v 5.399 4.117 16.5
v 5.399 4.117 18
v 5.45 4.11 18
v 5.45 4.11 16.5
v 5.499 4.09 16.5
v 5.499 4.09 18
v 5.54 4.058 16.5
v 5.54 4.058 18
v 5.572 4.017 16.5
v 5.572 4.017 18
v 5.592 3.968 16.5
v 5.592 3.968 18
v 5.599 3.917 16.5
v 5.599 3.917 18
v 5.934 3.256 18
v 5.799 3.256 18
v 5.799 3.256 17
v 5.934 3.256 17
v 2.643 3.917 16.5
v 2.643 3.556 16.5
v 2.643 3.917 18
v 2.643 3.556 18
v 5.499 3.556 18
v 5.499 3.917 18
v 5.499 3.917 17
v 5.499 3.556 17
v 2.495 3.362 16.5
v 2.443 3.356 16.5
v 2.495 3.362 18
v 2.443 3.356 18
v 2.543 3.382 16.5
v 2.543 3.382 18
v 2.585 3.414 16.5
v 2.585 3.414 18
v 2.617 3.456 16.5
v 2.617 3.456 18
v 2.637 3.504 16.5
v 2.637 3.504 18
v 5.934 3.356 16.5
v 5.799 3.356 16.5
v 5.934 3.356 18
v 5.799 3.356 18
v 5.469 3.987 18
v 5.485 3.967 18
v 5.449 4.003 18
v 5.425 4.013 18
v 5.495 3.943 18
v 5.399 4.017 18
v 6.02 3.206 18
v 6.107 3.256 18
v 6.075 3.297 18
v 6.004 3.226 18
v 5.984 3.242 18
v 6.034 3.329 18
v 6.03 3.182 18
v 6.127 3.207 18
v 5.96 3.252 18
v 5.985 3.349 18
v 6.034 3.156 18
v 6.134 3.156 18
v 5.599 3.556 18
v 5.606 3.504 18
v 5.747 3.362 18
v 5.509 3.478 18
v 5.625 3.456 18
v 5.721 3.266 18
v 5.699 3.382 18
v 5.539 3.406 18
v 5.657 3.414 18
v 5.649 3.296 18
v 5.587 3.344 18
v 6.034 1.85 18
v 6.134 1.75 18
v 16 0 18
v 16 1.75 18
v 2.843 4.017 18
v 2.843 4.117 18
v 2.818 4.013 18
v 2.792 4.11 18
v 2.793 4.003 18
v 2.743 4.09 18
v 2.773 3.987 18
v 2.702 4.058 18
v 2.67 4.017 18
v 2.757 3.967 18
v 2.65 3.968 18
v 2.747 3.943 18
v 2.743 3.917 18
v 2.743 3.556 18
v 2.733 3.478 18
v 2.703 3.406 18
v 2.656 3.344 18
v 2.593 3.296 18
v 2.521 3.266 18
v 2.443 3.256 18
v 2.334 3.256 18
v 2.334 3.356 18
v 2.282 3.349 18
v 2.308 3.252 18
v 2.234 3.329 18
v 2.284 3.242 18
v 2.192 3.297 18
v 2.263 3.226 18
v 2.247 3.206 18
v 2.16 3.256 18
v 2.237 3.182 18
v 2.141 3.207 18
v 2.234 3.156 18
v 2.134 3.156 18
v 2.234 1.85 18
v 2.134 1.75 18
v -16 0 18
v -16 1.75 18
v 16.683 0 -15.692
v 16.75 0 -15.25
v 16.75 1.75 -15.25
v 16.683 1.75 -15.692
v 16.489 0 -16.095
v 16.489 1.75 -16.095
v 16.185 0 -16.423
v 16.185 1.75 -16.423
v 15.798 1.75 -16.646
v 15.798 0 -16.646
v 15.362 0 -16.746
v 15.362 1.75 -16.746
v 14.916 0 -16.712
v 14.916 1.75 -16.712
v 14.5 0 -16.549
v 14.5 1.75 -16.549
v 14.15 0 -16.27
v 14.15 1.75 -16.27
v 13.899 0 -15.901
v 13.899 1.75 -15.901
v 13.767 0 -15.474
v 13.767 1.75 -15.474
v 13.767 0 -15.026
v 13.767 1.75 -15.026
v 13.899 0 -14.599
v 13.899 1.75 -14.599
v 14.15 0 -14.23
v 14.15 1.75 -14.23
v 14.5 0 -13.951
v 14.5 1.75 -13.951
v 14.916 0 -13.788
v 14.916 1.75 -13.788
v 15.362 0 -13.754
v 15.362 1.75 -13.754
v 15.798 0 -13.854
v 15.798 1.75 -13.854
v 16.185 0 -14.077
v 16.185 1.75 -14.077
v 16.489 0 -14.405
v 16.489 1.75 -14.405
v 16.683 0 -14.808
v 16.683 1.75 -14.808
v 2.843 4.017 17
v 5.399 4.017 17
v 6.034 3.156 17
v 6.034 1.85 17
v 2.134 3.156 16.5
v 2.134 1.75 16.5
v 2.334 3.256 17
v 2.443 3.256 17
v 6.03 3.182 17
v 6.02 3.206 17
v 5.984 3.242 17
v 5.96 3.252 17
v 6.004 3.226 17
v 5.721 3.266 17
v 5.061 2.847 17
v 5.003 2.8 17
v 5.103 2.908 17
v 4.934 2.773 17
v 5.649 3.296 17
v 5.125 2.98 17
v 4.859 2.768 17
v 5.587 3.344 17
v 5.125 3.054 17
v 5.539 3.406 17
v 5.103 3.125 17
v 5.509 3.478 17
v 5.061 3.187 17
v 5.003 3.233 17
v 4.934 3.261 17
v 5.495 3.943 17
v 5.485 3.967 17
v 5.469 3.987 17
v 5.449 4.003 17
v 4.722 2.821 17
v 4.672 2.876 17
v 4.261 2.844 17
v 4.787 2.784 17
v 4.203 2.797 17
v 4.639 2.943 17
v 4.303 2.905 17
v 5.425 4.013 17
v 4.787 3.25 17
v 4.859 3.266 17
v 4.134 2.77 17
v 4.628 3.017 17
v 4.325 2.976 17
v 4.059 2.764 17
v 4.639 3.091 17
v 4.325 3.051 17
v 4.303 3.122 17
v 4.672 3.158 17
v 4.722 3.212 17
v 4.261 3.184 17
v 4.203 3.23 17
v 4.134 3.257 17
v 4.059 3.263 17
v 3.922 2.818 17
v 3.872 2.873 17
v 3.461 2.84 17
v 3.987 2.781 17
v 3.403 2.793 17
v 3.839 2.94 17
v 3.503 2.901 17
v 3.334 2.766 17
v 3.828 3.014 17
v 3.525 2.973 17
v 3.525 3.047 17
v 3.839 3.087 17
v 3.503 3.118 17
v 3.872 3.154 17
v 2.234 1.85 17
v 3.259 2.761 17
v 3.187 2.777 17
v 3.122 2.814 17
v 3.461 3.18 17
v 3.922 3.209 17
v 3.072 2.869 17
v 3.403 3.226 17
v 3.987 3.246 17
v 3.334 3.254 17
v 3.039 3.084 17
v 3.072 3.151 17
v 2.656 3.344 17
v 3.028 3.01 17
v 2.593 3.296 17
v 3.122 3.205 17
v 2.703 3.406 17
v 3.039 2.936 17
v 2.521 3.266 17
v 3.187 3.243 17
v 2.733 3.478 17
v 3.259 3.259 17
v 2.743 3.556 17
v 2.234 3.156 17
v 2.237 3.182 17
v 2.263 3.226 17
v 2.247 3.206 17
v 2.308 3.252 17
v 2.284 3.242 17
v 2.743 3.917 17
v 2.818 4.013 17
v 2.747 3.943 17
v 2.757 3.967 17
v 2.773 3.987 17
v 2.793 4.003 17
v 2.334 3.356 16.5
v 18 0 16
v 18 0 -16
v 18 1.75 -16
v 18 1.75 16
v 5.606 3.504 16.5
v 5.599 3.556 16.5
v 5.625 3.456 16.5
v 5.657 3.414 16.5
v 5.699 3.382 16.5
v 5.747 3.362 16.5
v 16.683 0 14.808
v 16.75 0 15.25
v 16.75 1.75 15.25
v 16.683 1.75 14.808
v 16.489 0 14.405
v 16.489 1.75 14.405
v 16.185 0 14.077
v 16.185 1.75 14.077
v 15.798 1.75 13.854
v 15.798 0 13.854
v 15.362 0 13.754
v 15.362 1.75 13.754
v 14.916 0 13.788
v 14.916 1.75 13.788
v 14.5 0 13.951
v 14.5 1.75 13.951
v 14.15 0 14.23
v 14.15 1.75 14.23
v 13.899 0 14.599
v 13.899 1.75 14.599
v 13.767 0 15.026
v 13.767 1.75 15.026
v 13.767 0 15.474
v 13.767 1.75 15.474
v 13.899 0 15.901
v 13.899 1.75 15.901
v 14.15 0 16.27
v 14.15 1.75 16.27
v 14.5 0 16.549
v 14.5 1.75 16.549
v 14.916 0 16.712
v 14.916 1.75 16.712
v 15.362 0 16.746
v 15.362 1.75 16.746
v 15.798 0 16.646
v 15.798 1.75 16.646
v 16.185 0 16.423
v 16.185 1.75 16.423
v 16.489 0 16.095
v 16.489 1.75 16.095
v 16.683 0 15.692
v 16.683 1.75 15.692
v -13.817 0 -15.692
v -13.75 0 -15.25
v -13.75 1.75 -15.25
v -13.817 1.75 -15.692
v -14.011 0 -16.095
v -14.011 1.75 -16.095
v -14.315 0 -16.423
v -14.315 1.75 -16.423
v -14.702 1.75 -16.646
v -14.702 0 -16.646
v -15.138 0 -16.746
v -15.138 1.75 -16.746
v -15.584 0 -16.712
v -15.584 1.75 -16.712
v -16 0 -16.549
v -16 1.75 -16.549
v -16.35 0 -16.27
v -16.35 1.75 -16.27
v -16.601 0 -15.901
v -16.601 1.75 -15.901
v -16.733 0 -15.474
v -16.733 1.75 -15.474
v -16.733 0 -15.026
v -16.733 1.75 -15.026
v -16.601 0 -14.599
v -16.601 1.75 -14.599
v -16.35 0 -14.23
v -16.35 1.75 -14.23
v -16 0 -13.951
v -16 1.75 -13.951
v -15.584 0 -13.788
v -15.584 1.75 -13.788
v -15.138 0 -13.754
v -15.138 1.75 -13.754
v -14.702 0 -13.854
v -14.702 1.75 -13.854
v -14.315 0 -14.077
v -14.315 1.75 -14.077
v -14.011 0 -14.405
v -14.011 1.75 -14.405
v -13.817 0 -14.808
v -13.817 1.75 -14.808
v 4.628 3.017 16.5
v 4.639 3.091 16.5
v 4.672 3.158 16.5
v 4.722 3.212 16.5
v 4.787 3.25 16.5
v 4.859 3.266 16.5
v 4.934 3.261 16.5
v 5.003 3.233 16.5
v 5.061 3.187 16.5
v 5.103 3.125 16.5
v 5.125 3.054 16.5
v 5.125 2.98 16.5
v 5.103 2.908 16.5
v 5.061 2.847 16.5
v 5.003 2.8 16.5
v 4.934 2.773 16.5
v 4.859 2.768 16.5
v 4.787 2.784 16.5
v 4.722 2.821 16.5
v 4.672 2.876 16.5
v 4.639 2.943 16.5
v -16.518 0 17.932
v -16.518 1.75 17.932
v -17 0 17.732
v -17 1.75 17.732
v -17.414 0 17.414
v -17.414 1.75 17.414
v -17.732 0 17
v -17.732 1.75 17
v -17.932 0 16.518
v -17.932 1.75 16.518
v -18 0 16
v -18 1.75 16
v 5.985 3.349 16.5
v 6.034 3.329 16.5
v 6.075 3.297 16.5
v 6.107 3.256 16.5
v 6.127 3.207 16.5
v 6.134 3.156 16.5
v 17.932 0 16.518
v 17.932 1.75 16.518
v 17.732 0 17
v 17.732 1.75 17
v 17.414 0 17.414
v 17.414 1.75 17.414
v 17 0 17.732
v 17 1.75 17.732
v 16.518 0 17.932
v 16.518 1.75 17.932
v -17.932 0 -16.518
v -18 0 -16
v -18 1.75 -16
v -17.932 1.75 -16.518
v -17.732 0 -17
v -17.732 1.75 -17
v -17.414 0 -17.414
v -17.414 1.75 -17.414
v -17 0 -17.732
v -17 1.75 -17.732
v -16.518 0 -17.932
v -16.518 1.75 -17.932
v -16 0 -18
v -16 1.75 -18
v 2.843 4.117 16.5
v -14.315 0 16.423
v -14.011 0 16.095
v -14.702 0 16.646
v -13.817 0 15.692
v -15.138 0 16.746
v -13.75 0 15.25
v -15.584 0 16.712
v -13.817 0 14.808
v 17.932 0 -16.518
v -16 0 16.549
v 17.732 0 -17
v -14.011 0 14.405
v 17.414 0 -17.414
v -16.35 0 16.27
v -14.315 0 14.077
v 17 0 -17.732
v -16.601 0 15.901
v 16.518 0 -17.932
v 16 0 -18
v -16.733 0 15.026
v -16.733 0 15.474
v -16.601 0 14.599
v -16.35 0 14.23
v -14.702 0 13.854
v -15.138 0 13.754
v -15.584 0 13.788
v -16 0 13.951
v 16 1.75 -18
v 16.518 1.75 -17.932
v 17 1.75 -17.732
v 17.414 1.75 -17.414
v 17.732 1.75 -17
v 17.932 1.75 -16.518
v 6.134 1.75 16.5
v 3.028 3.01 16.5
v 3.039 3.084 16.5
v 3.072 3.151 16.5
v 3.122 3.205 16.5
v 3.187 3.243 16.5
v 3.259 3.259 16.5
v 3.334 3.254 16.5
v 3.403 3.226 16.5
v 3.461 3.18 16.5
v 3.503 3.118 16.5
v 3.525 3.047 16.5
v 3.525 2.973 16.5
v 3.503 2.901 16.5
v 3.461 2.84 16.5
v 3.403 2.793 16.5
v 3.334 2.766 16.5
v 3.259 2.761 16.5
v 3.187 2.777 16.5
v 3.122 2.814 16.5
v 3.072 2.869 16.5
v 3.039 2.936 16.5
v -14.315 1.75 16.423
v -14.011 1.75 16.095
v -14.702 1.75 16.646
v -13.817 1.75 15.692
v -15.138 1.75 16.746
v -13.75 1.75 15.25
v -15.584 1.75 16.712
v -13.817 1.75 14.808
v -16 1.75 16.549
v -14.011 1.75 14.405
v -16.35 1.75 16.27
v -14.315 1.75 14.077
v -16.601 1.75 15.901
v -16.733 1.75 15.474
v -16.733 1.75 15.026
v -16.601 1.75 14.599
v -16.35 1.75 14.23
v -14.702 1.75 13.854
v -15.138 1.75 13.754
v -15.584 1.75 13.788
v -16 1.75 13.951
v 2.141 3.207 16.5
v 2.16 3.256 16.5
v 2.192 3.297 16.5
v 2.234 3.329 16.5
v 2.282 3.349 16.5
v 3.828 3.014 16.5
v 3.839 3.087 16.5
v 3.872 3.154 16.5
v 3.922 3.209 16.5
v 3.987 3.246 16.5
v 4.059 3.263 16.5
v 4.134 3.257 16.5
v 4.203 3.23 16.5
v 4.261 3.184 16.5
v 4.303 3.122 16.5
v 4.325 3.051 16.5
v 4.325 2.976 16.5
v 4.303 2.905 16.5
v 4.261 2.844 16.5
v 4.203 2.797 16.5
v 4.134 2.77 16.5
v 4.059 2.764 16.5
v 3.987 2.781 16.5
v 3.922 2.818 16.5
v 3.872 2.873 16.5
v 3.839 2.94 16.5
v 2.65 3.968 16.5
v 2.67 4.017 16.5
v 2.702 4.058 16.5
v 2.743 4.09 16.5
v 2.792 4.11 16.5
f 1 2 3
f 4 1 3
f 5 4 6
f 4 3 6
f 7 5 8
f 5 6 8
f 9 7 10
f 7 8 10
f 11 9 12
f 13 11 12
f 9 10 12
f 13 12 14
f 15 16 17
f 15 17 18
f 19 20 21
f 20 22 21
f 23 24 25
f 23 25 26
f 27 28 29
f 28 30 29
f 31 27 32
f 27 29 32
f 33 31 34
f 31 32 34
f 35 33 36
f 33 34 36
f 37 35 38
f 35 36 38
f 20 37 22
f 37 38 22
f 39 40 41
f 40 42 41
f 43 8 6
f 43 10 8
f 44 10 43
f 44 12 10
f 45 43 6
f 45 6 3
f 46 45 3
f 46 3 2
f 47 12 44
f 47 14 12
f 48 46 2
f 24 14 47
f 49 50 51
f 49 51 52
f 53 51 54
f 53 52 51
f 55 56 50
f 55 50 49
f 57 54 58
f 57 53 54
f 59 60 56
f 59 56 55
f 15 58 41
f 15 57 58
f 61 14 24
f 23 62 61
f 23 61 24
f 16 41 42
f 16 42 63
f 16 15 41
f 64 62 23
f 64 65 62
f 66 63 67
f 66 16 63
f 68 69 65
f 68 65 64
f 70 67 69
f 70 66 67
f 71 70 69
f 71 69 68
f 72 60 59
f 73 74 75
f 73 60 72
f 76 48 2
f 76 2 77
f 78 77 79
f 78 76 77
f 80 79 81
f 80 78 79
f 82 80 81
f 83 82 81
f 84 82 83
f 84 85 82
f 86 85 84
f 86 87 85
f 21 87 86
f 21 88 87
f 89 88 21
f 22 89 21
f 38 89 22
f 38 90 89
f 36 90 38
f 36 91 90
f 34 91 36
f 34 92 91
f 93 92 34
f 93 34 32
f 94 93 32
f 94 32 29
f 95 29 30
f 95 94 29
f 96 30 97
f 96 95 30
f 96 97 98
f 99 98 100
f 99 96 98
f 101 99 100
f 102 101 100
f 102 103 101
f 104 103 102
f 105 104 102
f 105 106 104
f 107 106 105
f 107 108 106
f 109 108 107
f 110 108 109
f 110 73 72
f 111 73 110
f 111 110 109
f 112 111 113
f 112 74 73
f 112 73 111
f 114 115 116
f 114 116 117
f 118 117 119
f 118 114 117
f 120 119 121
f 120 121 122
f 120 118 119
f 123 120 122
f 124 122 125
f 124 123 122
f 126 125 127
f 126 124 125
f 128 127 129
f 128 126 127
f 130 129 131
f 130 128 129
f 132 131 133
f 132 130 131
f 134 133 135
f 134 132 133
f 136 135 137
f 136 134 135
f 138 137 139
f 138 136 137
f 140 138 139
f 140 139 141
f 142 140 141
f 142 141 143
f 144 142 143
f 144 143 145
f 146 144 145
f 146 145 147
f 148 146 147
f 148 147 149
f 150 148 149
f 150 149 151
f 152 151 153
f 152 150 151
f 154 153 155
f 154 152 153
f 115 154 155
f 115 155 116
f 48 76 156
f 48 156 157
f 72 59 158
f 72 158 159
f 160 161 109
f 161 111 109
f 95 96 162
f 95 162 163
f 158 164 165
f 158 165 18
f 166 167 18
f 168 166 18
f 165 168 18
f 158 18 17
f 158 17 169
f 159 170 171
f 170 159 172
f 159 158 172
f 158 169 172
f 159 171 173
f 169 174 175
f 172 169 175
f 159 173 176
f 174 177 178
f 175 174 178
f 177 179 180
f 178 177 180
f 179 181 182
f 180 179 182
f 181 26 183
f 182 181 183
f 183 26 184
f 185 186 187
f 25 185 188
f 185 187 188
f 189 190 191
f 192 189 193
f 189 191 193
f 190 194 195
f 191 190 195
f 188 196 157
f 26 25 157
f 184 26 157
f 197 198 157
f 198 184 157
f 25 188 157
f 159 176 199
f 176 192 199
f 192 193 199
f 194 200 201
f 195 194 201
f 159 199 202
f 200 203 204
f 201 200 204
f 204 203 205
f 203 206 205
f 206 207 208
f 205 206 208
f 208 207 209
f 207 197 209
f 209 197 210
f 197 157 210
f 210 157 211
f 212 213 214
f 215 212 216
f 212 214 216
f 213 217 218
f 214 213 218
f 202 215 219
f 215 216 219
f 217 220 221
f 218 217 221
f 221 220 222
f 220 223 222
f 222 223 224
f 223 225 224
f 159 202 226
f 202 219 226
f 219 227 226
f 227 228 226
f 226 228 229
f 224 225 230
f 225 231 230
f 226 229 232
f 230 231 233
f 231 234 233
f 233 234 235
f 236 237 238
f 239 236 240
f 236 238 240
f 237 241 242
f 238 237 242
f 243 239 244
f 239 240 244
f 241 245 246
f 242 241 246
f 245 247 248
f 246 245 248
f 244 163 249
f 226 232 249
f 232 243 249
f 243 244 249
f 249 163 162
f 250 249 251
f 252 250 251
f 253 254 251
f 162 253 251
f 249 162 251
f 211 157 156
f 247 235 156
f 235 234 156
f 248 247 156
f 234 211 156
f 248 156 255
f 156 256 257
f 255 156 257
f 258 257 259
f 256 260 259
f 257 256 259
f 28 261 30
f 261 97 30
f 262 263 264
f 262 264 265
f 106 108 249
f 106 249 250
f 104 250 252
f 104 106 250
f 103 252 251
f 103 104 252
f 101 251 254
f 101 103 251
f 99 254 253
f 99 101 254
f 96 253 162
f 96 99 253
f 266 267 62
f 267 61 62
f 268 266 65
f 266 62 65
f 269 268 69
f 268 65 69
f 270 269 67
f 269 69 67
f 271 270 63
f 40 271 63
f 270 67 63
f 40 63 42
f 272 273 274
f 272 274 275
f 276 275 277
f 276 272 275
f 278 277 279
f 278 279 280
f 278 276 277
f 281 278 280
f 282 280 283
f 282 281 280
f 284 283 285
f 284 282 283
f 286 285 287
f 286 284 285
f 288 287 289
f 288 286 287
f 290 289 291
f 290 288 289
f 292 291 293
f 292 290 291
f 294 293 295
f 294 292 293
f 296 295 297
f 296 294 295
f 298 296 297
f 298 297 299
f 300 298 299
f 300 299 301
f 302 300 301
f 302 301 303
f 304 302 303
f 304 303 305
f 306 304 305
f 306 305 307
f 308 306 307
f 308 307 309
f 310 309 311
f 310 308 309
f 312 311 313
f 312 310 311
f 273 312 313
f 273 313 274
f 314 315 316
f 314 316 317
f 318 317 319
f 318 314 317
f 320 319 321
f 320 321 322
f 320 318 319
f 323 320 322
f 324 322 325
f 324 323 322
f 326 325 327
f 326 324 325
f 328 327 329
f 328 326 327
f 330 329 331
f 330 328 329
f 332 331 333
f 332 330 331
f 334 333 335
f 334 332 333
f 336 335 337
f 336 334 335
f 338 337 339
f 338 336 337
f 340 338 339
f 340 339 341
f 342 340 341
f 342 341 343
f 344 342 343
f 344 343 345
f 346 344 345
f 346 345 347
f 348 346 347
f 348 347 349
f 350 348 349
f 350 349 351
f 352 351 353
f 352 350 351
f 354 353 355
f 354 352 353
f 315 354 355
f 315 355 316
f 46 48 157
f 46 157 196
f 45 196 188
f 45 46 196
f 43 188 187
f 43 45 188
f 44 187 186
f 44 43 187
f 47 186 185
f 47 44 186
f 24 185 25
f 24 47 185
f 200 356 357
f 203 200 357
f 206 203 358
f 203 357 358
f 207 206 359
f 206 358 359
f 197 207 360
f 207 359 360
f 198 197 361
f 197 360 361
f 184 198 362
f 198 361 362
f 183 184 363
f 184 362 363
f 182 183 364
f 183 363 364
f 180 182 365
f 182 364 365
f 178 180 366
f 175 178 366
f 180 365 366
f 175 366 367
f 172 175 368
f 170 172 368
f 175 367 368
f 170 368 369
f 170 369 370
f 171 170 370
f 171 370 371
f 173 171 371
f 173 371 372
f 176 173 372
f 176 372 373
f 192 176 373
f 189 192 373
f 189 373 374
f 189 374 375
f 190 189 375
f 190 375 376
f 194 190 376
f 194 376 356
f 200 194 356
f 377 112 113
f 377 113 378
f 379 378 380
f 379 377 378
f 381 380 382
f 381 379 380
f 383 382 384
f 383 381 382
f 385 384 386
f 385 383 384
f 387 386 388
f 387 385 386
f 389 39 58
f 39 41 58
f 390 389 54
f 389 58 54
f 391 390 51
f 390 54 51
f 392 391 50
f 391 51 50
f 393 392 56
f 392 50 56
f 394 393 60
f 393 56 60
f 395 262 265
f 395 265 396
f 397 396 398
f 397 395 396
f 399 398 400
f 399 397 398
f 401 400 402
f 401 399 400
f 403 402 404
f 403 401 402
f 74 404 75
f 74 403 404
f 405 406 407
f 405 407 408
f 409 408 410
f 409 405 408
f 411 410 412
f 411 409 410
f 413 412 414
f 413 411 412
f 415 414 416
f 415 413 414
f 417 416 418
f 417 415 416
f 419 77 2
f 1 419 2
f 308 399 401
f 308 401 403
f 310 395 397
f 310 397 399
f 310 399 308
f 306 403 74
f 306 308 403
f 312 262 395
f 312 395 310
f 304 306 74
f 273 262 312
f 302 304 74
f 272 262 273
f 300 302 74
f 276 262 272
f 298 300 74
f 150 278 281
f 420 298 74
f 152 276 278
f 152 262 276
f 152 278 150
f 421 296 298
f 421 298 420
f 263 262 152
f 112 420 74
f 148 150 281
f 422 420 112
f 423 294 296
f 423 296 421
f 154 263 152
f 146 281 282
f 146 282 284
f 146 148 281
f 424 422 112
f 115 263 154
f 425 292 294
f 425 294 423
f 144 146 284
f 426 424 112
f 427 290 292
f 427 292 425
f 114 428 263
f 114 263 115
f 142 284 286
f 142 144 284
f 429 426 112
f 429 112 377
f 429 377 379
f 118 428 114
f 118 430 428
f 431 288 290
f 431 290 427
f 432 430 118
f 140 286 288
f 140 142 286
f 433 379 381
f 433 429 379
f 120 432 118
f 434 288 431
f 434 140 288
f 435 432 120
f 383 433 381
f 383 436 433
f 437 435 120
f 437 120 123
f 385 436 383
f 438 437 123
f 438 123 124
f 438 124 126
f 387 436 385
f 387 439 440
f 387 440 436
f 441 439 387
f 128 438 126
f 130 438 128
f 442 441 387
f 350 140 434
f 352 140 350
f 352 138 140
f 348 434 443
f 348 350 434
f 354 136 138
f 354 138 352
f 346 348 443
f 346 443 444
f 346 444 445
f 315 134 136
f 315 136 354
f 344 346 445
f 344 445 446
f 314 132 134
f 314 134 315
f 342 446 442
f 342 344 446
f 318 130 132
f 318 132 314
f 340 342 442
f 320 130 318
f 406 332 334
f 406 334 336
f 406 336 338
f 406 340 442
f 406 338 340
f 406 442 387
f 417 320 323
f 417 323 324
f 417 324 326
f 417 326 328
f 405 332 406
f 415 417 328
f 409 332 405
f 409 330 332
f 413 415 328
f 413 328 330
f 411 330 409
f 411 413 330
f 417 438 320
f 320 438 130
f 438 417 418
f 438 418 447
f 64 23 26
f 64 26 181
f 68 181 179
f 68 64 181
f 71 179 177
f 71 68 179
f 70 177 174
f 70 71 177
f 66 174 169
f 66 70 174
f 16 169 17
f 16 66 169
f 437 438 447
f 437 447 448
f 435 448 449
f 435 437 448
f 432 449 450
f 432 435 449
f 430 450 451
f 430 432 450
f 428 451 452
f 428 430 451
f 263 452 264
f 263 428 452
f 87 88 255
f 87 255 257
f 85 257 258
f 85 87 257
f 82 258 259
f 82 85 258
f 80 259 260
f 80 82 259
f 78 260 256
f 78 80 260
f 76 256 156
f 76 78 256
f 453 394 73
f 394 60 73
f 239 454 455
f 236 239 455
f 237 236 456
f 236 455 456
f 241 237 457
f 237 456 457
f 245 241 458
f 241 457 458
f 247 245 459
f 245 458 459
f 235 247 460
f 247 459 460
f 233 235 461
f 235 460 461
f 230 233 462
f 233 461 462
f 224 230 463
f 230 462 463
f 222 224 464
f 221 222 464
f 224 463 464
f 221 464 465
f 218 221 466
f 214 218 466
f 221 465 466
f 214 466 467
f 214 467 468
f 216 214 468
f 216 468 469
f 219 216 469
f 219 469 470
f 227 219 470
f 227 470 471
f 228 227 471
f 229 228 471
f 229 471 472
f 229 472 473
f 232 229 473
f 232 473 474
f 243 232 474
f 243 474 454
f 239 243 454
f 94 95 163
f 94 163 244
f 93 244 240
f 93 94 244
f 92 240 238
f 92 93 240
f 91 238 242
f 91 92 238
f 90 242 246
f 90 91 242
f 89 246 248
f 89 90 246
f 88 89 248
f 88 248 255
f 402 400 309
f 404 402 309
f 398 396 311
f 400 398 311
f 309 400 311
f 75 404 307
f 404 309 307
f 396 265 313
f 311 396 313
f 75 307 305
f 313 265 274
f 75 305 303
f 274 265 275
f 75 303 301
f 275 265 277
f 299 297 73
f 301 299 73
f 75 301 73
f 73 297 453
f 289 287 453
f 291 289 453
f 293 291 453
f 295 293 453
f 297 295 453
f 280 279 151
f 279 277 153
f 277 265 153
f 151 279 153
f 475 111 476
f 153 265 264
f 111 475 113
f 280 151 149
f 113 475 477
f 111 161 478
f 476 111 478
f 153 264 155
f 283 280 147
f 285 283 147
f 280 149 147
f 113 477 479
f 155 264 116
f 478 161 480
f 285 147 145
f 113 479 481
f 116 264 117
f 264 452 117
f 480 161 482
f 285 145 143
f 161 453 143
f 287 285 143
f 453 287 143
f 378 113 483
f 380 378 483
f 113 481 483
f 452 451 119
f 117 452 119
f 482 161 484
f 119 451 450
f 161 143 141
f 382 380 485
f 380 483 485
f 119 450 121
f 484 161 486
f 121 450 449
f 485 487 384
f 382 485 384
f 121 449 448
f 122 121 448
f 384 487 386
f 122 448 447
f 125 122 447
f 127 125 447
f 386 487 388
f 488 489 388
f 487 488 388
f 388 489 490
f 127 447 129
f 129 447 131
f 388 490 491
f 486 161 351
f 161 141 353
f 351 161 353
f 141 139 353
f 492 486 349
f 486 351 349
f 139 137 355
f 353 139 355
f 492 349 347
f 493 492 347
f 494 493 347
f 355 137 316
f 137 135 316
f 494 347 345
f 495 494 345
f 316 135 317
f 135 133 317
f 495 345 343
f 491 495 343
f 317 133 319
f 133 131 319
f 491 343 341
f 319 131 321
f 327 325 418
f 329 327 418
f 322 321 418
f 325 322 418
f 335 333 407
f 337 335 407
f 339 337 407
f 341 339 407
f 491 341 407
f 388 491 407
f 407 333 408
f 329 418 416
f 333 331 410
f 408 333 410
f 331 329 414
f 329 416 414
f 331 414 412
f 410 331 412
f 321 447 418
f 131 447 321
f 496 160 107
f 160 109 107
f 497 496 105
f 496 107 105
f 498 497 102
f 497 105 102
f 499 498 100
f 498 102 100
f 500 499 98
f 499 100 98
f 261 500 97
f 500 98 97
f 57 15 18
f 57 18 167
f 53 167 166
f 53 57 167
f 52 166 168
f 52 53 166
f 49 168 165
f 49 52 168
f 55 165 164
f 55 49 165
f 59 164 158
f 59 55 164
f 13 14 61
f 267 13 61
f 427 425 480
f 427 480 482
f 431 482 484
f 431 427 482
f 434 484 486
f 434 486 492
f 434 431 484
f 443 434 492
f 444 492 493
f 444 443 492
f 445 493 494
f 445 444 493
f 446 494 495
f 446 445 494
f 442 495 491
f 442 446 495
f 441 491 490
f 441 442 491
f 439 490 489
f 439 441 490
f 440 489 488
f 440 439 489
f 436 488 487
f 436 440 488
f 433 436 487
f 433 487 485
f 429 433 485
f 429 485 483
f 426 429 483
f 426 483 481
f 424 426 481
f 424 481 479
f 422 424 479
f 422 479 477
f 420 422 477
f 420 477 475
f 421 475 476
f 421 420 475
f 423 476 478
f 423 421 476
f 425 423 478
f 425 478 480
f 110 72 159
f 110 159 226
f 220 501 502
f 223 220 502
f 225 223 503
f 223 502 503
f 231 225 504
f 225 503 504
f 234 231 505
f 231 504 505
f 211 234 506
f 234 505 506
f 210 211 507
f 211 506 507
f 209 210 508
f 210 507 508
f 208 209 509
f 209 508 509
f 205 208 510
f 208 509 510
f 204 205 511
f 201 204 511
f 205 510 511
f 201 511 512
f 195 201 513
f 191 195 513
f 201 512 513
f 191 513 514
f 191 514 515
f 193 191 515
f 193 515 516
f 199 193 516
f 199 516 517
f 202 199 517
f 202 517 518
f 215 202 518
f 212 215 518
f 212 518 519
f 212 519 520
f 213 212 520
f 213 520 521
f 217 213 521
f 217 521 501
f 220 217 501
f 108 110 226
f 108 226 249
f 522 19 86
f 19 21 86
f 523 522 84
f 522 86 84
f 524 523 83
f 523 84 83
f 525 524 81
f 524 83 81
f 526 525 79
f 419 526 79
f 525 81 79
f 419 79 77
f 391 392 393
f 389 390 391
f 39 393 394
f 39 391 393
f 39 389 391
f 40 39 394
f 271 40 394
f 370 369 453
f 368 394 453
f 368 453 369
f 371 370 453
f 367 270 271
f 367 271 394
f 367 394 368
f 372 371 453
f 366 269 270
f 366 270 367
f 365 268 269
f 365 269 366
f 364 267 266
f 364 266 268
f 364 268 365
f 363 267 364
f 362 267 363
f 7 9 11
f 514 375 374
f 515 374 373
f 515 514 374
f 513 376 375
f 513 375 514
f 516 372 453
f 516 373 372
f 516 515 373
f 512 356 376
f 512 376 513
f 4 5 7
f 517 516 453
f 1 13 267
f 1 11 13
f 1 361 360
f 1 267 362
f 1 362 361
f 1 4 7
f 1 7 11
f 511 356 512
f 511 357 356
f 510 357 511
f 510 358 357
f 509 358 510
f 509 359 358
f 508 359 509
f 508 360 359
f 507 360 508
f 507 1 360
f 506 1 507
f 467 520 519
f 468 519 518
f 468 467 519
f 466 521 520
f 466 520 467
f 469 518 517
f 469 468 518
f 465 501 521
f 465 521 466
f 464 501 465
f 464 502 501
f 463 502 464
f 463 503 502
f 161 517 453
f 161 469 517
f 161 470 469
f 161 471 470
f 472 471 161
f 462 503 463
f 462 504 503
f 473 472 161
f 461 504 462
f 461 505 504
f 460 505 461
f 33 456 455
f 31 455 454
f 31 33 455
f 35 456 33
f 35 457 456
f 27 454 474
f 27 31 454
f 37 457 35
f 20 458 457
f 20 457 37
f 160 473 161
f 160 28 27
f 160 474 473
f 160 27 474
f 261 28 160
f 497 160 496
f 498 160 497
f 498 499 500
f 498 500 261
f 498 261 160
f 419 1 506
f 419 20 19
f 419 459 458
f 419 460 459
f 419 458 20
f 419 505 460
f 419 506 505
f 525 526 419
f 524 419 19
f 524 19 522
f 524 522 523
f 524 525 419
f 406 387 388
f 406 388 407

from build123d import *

# Parameters (mm, degrees)
SKETCH1_R           = 1.5
BOSS_EXTRUDE1_DEPTH = 1.75
BOSS_EXTRUDE6_DEPTH = 1
BOSS_EXTRUDE7_DEPTH = 0.5
CUT_EXTRUDE1_REACH  = 3.5
SKETCH7_R           = 0.25


with BuildPart() as part:
    # Sketch1 → Boss-Extrude1 (new body)
    with BuildSketch(Plane(origin=(0, 0, 0), x_dir=(1, 0, 0), z_dir=(0, 1, 0))):
        with BuildLine():
            Line((-16, 18), (16, 18))
            ThreePointArc((16, 18), (17.414213562, 17.414213562), (18, 16))
            Line((18, 16), (18, -16))
            ThreePointArc((18, -16), (17.414213562, -17.414213562), (16, -18))
            Line((16, -18), (-16, -18))
            ThreePointArc((-16, -18), (-17.414213562, -17.414213562), (-18, -16))
            Line((-18, -16), (-18, 16))
            ThreePointArc((-18, 16), (-17.414213562, 17.414213562), (-16, 18))
        make_face()
        with Locations((-15.25, 15.25)):
            Circle(SKETCH1_R, mode=Mode.SUBTRACT)
        with Locations((15.25, 15.25)):
            Circle(SKETCH1_R, mode=Mode.SUBTRACT)
        with Locations((-15.25, -15.25)):
            Circle(SKETCH1_R, mode=Mode.SUBTRACT)
        with Locations((15.25, -15.25)):
            Circle(SKETCH1_R, mode=Mode.SUBTRACT)
    extrude(amount=BOSS_EXTRUDE1_DEPTH)

    # Sketch2 → Boss-Extrude6 (add)
    with BuildSketch(Plane.XY.offset(18)):
        with BuildLine():
            Line((2.843456523, 4.116656207), (5.398697456, 4.116656207))
            ThreePointArc((5.398697456, 4.116656207), (5.540118812, 4.058077564), (5.598697456, 3.916656207))
            Line((5.598697456, 3.916656207), (5.598697456, 3.555649959))
            ThreePointArc((5.598697456, 3.555649959), (5.6572761, 3.414228602), (5.798697456, 3.355649959))
            Line((5.798697456, 3.355649959), (5.933688948, 3.355649959))
            ThreePointArc((5.933688948, 3.355649959), (6.075110304, 3.297071315), (6.133688948, 3.155649959))
            Line((6.133688948, 3.155649959), (6.133688948, 1.75))
            Line((6.133688948, 1.75), (2.133688948, 1.75))
            Line((2.133688948, 1.75), (2.133688948, 3.155649959))
            ThreePointArc((2.133688948, 3.155649959), (2.192267592, 3.297071315), (2.333688948, 3.355649959))
            Line((2.333688948, 3.355649959), (2.443456523, 3.355649959))
            ThreePointArc((2.443456523, 3.355649959), (2.58487788, 3.414228602), (2.643456523, 3.555649959))
            Line((2.643456523, 3.555649959), (2.643456523, 3.916656207))
            ThreePointArc((2.643456523, 3.916656207), (2.702035167, 4.058077564), (2.843456523, 4.116656207))
        make_face()
        with BuildLine():
            Line((2.843456523, 4.016656207), (5.398697456, 4.016656207))
            ThreePointArc((5.398697456, 4.016656207), (5.469408134, 3.987366886), (5.498697456, 3.916656207))
            Line((5.498697456, 3.916656207), (5.498697456, 3.555649959))
            ThreePointArc((5.498697456, 3.555649959), (5.586565422, 3.343517924), (5.798697456, 3.255649959))
            Line((5.798697456, 3.255649959), (5.933688948, 3.255649959))
            ThreePointArc((5.933688948, 3.255649959), (6.004399626, 3.226360637), (6.033688948, 3.155649959))
            Line((6.033688948, 3.155649959), (6.033688948, 1.85))
            Line((6.033688948, 1.85), (2.233688948, 1.85))
            Line((2.233688948, 1.85), (2.233688948, 3.155649959))
            ThreePointArc((2.233688948, 3.155649959), (2.26297827, 3.226360637), (2.333688948, 3.255649959))
            Line((2.333688948, 3.255649959), (2.443456523, 3.255649959))
            ThreePointArc((2.443456523, 3.255649959), (2.655588558, 3.343517924), (2.743456523, 3.555649959))
            Line((2.743456523, 3.555649959), (2.743456523, 3.916656207))
            ThreePointArc((2.743456523, 3.916656207), (2.772745845, 3.987366886), (2.843456523, 4.016656207))
        make_face(mode=Mode.SUBTRACT)
    extrude(amount=-BOSS_EXTRUDE6_DEPTH)

    # Sketch6 → Boss-Extrude7 (add)
    with BuildSketch(Plane(origin=(0, 0, 17), x_dir=(-1, 0, 0), z_dir=(0, 0, -1))):
        with BuildLine():
            Line((-5.598697456, 3.916656207), (-5.598697456, 3.555649959))
            ThreePointArc((-5.598697456, 3.555649959), (-5.6572761, 3.414228602), (-5.798697456, 3.355649959))
            Line((-5.798697456, 3.355649959), (-5.933688948, 3.355649959))
            ThreePointArc((-5.933688948, 3.355649959), (-6.075110304, 3.297071315), (-6.133688948, 3.155649959))
            Line((-6.133688948, 3.155649959), (-6.133688948, 1.75))
            Line((-6.133688948, 1.75), (-2.133688948, 1.75))
            Line((-2.133688948, 1.75), (-2.133688948, 3.155649959))
            ThreePointArc((-2.133688948, 3.155649959), (-2.192267592, 3.297071315), (-2.333688948, 3.355649959))
            Line((-2.333688948, 3.355649959), (-2.443456523, 3.355649959))
            ThreePointArc((-2.443456523, 3.355649959), (-2.58487788, 3.414228602), (-2.643456523, 3.555649959))
            Line((-2.643456523, 3.555649959), (-2.643456523, 3.916656207))
            ThreePointArc((-2.643456523, 3.916656207), (-2.702035167, 4.058077564), (-2.843456523, 4.116656207))
            Line((-2.843456523, 4.116656207), (-5.398697456, 4.116656207))
            ThreePointArc((-5.398697456, 4.116656207), (-5.540118812, 4.058077564), (-5.598697456, 3.916656207))
        make_face()
    extrude(amount=BOSS_EXTRUDE7_DEPTH)

    # Sketch7 → Cut-Extrude1 (cut, up to next)
    with BuildSketch(Plane(origin=(0, 0, 16.5), x_dir=(-1, 0, 0), z_dir=(0, 0, -1)), mode=Mode.PRIVATE) as cut_extrude1_sk1:
        with Locations((-4.878111957, 3.016893087)):
            Circle(SKETCH7_R)
    cut_extrude1_tool1 = extrude(cut_extrude1_sk1.sketch, amount=-CUT_EXTRUDE1_REACH, mode=Mode.PRIVATE) & part.part
    add(cut_extrude1_tool1.solids().sort_by_distance((4.878112, 3.016893, 16.5))[0], mode=Mode.SUBTRACT)
    # Sketch7 → Cut-Extrude1 (cut, up to next)
    with BuildSketch(Plane(origin=(0, 0, 16.5), x_dir=(-1, 0, 0), z_dir=(0, 0, -1)), mode=Mode.PRIVATE) as cut_extrude1_sk2:
        with Locations((-4.078118838, 3.013574967)):
            Circle(SKETCH7_R)
    cut_extrude1_tool2 = extrude(cut_extrude1_sk2.sketch, amount=-CUT_EXTRUDE1_REACH, mode=Mode.PRIVATE) & part.part
    add(cut_extrude1_tool2.solids().sort_by_distance((4.078119, 3.013575, 16.5))[0], mode=Mode.SUBTRACT)
    # Sketch7 → Cut-Extrude1 (cut, up to next)
    with BuildSketch(Plane(origin=(0, 0, 16.5), x_dir=(-1, 0, 0), z_dir=(0, 0, -1)), mode=Mode.PRIVATE) as cut_extrude1_sk3:
        with Locations((-3.278127018, 3.00995723)):
            Circle(SKETCH7_R)
    cut_extrude1_tool3 = extrude(cut_extrude1_sk3.sketch, amount=-CUT_EXTRUDE1_REACH, mode=Mode.PRIVATE) & part.part
    add(cut_extrude1_tool3.solids().sort_by_distance((3.278127, 3.009957, 16.5))[0], mode=Mode.SUBTRACT)


solid = part.part
